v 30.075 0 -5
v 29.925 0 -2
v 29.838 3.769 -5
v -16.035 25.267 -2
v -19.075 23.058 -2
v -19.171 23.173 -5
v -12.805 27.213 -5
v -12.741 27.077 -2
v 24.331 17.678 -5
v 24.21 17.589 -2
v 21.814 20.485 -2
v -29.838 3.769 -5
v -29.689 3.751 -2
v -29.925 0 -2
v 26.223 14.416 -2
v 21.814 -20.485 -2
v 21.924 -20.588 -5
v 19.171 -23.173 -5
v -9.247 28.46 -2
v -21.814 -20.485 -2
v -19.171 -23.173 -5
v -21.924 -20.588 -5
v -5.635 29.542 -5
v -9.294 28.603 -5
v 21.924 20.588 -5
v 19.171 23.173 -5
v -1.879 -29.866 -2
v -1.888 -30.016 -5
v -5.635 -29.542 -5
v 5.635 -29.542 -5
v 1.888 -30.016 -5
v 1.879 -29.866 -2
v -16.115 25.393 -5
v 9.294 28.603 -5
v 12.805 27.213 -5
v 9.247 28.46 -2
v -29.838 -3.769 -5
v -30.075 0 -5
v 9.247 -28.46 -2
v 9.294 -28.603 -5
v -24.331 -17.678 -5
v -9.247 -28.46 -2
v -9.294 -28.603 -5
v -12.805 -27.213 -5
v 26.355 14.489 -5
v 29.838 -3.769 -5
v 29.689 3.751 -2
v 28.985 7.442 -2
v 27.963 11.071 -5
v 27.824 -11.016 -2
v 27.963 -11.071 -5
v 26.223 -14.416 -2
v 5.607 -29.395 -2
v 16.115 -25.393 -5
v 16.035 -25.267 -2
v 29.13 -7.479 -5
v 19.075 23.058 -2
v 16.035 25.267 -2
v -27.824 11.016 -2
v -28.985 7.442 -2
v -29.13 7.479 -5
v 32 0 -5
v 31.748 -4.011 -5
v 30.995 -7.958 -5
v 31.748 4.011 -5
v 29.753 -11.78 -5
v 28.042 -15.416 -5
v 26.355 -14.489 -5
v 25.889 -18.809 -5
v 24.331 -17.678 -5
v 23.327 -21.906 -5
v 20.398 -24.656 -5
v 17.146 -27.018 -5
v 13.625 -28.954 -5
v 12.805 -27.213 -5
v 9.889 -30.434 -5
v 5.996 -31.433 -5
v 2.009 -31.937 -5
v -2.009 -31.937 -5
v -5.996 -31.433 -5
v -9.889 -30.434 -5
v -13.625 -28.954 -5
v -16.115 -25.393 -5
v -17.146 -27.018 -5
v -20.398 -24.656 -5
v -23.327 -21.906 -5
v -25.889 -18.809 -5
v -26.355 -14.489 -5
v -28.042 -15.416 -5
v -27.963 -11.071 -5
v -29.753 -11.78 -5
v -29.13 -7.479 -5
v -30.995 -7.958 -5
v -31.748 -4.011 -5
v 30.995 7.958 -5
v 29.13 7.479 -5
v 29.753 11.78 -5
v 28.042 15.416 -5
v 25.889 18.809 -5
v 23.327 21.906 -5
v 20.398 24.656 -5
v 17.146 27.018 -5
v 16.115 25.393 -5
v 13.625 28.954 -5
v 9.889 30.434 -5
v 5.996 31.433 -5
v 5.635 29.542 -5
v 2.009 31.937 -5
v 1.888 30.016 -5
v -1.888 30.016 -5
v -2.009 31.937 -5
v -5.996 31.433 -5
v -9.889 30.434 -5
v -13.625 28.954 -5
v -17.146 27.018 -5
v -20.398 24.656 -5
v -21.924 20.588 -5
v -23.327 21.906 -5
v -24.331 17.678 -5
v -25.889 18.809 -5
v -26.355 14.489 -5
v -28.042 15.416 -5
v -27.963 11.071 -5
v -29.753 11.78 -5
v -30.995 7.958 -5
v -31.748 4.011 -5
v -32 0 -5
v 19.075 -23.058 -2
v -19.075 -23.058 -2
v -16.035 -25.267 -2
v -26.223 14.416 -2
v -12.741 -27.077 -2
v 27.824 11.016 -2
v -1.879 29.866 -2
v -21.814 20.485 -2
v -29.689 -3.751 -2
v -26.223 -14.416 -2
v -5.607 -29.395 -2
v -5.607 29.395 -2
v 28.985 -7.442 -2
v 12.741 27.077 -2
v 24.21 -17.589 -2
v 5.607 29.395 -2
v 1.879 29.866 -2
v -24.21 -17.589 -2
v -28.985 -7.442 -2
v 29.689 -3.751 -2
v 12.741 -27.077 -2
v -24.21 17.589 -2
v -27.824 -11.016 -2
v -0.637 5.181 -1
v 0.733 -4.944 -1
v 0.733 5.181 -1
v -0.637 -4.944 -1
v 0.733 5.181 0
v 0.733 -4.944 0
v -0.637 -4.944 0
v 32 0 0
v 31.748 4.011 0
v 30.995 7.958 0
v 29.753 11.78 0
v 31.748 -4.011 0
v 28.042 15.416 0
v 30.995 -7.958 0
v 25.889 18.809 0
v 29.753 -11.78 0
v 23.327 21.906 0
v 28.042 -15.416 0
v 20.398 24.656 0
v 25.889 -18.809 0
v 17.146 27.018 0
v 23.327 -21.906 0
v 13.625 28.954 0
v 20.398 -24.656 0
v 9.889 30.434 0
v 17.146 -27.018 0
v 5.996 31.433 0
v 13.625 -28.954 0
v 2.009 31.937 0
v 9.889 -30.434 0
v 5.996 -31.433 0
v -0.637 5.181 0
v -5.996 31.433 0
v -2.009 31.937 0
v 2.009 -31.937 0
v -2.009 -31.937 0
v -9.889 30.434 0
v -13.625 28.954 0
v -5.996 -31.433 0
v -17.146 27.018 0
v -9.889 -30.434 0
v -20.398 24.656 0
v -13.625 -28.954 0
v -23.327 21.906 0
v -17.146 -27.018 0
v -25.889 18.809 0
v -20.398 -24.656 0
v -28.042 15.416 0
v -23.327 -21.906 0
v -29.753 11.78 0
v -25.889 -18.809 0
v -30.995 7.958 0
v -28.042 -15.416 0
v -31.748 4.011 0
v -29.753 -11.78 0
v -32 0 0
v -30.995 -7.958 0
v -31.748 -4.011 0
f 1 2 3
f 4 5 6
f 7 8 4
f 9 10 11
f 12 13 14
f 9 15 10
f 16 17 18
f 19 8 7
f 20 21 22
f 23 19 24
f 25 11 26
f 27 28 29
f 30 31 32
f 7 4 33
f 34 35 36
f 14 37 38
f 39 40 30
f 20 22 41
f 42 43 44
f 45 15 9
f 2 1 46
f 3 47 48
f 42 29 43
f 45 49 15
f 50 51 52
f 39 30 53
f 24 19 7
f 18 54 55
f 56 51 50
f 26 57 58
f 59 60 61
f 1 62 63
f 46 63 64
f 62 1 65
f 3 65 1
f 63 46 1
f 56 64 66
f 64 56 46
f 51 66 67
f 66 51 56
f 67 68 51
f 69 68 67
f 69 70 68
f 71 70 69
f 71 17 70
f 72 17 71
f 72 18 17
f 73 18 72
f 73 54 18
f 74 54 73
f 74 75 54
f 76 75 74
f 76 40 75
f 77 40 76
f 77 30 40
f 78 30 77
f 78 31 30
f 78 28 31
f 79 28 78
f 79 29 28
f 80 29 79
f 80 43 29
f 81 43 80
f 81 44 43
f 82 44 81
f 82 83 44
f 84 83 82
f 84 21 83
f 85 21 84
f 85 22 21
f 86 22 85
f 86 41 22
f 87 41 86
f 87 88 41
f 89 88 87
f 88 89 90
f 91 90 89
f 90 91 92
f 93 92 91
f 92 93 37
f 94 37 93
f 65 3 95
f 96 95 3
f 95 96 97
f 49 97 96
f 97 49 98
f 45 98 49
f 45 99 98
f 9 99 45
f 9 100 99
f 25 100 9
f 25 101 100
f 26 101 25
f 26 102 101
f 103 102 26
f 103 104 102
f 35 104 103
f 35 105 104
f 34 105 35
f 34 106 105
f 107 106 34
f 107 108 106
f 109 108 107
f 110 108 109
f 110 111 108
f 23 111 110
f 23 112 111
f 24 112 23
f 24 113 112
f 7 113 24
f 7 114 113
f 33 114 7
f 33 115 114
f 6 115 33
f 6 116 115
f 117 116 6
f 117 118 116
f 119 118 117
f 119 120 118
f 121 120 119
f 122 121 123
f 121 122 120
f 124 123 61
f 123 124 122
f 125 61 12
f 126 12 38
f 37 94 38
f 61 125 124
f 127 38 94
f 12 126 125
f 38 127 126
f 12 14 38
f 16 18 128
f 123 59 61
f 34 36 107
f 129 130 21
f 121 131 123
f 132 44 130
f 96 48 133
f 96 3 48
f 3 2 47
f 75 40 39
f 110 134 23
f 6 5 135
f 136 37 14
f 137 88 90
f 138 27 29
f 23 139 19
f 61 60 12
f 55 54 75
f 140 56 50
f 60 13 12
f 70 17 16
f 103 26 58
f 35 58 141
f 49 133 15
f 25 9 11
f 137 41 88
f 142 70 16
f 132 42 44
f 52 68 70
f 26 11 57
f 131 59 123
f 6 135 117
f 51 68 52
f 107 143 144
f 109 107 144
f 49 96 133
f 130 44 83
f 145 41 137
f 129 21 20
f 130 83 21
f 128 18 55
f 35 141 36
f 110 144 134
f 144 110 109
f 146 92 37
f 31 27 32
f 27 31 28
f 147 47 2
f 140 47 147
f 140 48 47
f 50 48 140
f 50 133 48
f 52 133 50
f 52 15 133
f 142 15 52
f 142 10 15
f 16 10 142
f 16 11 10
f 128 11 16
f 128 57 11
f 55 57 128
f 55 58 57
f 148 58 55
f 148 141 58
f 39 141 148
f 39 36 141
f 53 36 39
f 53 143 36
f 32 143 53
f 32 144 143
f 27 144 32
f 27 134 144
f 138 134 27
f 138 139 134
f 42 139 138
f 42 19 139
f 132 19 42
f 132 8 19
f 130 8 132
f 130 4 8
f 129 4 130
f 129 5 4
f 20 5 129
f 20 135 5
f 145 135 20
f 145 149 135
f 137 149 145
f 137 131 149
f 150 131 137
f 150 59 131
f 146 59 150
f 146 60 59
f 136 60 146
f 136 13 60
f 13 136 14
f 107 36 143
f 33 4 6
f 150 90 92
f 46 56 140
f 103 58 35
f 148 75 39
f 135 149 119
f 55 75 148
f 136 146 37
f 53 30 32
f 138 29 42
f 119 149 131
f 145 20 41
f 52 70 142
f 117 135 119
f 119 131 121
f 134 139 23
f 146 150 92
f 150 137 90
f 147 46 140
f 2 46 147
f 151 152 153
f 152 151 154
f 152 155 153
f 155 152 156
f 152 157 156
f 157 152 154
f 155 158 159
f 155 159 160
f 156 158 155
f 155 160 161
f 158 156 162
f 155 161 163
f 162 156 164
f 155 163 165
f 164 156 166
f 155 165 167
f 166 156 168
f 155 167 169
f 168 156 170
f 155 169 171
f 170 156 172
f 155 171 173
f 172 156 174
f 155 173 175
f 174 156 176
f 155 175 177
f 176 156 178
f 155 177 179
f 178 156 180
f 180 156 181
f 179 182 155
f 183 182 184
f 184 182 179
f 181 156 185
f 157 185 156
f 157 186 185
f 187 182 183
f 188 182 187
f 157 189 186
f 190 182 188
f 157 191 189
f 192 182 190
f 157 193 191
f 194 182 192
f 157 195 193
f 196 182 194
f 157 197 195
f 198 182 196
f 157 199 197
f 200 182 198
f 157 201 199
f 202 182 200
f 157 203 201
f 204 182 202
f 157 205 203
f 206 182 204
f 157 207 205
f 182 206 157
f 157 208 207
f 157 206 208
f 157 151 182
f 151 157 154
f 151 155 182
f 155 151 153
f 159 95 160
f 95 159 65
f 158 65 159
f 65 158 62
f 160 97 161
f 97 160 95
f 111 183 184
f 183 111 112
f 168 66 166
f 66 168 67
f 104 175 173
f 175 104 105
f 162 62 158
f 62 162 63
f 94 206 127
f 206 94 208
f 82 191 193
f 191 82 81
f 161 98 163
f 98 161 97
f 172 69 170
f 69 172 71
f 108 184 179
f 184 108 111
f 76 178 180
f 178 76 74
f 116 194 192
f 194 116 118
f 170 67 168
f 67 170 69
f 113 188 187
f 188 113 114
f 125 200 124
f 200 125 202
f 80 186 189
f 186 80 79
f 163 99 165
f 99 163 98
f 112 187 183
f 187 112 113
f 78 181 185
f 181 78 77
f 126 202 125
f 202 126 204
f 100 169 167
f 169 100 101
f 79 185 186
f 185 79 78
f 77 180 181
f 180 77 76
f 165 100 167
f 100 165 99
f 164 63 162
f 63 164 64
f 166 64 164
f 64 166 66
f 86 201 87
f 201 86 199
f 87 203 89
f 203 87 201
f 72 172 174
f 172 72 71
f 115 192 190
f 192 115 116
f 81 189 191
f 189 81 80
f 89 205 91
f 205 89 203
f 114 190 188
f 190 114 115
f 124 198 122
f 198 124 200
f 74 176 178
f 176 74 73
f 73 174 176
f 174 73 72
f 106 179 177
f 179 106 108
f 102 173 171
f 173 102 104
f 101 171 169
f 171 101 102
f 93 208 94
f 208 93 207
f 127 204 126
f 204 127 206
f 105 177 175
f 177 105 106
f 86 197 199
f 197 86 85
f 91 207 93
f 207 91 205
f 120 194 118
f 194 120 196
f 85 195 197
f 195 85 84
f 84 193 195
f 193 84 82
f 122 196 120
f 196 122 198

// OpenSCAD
$fn = 50;

difference() {
	union() {
		translate(v = [0, 0, -5.0]) {
			cylinder(h = 5, r = 32.0);
		}
	}
	union() {
		#translate(v = [0, 0, -5.0]) {
			cylinder(h = 3, r1 = 30.075, r2 = 29.925);
		}
		translate(v = [0, 0, -1]) {
			linear_extrude(height = 1) {
				text(font = "Impact", halign = "center", size = 10, text = "I", valign = "center");
			}
		}
	}
}
